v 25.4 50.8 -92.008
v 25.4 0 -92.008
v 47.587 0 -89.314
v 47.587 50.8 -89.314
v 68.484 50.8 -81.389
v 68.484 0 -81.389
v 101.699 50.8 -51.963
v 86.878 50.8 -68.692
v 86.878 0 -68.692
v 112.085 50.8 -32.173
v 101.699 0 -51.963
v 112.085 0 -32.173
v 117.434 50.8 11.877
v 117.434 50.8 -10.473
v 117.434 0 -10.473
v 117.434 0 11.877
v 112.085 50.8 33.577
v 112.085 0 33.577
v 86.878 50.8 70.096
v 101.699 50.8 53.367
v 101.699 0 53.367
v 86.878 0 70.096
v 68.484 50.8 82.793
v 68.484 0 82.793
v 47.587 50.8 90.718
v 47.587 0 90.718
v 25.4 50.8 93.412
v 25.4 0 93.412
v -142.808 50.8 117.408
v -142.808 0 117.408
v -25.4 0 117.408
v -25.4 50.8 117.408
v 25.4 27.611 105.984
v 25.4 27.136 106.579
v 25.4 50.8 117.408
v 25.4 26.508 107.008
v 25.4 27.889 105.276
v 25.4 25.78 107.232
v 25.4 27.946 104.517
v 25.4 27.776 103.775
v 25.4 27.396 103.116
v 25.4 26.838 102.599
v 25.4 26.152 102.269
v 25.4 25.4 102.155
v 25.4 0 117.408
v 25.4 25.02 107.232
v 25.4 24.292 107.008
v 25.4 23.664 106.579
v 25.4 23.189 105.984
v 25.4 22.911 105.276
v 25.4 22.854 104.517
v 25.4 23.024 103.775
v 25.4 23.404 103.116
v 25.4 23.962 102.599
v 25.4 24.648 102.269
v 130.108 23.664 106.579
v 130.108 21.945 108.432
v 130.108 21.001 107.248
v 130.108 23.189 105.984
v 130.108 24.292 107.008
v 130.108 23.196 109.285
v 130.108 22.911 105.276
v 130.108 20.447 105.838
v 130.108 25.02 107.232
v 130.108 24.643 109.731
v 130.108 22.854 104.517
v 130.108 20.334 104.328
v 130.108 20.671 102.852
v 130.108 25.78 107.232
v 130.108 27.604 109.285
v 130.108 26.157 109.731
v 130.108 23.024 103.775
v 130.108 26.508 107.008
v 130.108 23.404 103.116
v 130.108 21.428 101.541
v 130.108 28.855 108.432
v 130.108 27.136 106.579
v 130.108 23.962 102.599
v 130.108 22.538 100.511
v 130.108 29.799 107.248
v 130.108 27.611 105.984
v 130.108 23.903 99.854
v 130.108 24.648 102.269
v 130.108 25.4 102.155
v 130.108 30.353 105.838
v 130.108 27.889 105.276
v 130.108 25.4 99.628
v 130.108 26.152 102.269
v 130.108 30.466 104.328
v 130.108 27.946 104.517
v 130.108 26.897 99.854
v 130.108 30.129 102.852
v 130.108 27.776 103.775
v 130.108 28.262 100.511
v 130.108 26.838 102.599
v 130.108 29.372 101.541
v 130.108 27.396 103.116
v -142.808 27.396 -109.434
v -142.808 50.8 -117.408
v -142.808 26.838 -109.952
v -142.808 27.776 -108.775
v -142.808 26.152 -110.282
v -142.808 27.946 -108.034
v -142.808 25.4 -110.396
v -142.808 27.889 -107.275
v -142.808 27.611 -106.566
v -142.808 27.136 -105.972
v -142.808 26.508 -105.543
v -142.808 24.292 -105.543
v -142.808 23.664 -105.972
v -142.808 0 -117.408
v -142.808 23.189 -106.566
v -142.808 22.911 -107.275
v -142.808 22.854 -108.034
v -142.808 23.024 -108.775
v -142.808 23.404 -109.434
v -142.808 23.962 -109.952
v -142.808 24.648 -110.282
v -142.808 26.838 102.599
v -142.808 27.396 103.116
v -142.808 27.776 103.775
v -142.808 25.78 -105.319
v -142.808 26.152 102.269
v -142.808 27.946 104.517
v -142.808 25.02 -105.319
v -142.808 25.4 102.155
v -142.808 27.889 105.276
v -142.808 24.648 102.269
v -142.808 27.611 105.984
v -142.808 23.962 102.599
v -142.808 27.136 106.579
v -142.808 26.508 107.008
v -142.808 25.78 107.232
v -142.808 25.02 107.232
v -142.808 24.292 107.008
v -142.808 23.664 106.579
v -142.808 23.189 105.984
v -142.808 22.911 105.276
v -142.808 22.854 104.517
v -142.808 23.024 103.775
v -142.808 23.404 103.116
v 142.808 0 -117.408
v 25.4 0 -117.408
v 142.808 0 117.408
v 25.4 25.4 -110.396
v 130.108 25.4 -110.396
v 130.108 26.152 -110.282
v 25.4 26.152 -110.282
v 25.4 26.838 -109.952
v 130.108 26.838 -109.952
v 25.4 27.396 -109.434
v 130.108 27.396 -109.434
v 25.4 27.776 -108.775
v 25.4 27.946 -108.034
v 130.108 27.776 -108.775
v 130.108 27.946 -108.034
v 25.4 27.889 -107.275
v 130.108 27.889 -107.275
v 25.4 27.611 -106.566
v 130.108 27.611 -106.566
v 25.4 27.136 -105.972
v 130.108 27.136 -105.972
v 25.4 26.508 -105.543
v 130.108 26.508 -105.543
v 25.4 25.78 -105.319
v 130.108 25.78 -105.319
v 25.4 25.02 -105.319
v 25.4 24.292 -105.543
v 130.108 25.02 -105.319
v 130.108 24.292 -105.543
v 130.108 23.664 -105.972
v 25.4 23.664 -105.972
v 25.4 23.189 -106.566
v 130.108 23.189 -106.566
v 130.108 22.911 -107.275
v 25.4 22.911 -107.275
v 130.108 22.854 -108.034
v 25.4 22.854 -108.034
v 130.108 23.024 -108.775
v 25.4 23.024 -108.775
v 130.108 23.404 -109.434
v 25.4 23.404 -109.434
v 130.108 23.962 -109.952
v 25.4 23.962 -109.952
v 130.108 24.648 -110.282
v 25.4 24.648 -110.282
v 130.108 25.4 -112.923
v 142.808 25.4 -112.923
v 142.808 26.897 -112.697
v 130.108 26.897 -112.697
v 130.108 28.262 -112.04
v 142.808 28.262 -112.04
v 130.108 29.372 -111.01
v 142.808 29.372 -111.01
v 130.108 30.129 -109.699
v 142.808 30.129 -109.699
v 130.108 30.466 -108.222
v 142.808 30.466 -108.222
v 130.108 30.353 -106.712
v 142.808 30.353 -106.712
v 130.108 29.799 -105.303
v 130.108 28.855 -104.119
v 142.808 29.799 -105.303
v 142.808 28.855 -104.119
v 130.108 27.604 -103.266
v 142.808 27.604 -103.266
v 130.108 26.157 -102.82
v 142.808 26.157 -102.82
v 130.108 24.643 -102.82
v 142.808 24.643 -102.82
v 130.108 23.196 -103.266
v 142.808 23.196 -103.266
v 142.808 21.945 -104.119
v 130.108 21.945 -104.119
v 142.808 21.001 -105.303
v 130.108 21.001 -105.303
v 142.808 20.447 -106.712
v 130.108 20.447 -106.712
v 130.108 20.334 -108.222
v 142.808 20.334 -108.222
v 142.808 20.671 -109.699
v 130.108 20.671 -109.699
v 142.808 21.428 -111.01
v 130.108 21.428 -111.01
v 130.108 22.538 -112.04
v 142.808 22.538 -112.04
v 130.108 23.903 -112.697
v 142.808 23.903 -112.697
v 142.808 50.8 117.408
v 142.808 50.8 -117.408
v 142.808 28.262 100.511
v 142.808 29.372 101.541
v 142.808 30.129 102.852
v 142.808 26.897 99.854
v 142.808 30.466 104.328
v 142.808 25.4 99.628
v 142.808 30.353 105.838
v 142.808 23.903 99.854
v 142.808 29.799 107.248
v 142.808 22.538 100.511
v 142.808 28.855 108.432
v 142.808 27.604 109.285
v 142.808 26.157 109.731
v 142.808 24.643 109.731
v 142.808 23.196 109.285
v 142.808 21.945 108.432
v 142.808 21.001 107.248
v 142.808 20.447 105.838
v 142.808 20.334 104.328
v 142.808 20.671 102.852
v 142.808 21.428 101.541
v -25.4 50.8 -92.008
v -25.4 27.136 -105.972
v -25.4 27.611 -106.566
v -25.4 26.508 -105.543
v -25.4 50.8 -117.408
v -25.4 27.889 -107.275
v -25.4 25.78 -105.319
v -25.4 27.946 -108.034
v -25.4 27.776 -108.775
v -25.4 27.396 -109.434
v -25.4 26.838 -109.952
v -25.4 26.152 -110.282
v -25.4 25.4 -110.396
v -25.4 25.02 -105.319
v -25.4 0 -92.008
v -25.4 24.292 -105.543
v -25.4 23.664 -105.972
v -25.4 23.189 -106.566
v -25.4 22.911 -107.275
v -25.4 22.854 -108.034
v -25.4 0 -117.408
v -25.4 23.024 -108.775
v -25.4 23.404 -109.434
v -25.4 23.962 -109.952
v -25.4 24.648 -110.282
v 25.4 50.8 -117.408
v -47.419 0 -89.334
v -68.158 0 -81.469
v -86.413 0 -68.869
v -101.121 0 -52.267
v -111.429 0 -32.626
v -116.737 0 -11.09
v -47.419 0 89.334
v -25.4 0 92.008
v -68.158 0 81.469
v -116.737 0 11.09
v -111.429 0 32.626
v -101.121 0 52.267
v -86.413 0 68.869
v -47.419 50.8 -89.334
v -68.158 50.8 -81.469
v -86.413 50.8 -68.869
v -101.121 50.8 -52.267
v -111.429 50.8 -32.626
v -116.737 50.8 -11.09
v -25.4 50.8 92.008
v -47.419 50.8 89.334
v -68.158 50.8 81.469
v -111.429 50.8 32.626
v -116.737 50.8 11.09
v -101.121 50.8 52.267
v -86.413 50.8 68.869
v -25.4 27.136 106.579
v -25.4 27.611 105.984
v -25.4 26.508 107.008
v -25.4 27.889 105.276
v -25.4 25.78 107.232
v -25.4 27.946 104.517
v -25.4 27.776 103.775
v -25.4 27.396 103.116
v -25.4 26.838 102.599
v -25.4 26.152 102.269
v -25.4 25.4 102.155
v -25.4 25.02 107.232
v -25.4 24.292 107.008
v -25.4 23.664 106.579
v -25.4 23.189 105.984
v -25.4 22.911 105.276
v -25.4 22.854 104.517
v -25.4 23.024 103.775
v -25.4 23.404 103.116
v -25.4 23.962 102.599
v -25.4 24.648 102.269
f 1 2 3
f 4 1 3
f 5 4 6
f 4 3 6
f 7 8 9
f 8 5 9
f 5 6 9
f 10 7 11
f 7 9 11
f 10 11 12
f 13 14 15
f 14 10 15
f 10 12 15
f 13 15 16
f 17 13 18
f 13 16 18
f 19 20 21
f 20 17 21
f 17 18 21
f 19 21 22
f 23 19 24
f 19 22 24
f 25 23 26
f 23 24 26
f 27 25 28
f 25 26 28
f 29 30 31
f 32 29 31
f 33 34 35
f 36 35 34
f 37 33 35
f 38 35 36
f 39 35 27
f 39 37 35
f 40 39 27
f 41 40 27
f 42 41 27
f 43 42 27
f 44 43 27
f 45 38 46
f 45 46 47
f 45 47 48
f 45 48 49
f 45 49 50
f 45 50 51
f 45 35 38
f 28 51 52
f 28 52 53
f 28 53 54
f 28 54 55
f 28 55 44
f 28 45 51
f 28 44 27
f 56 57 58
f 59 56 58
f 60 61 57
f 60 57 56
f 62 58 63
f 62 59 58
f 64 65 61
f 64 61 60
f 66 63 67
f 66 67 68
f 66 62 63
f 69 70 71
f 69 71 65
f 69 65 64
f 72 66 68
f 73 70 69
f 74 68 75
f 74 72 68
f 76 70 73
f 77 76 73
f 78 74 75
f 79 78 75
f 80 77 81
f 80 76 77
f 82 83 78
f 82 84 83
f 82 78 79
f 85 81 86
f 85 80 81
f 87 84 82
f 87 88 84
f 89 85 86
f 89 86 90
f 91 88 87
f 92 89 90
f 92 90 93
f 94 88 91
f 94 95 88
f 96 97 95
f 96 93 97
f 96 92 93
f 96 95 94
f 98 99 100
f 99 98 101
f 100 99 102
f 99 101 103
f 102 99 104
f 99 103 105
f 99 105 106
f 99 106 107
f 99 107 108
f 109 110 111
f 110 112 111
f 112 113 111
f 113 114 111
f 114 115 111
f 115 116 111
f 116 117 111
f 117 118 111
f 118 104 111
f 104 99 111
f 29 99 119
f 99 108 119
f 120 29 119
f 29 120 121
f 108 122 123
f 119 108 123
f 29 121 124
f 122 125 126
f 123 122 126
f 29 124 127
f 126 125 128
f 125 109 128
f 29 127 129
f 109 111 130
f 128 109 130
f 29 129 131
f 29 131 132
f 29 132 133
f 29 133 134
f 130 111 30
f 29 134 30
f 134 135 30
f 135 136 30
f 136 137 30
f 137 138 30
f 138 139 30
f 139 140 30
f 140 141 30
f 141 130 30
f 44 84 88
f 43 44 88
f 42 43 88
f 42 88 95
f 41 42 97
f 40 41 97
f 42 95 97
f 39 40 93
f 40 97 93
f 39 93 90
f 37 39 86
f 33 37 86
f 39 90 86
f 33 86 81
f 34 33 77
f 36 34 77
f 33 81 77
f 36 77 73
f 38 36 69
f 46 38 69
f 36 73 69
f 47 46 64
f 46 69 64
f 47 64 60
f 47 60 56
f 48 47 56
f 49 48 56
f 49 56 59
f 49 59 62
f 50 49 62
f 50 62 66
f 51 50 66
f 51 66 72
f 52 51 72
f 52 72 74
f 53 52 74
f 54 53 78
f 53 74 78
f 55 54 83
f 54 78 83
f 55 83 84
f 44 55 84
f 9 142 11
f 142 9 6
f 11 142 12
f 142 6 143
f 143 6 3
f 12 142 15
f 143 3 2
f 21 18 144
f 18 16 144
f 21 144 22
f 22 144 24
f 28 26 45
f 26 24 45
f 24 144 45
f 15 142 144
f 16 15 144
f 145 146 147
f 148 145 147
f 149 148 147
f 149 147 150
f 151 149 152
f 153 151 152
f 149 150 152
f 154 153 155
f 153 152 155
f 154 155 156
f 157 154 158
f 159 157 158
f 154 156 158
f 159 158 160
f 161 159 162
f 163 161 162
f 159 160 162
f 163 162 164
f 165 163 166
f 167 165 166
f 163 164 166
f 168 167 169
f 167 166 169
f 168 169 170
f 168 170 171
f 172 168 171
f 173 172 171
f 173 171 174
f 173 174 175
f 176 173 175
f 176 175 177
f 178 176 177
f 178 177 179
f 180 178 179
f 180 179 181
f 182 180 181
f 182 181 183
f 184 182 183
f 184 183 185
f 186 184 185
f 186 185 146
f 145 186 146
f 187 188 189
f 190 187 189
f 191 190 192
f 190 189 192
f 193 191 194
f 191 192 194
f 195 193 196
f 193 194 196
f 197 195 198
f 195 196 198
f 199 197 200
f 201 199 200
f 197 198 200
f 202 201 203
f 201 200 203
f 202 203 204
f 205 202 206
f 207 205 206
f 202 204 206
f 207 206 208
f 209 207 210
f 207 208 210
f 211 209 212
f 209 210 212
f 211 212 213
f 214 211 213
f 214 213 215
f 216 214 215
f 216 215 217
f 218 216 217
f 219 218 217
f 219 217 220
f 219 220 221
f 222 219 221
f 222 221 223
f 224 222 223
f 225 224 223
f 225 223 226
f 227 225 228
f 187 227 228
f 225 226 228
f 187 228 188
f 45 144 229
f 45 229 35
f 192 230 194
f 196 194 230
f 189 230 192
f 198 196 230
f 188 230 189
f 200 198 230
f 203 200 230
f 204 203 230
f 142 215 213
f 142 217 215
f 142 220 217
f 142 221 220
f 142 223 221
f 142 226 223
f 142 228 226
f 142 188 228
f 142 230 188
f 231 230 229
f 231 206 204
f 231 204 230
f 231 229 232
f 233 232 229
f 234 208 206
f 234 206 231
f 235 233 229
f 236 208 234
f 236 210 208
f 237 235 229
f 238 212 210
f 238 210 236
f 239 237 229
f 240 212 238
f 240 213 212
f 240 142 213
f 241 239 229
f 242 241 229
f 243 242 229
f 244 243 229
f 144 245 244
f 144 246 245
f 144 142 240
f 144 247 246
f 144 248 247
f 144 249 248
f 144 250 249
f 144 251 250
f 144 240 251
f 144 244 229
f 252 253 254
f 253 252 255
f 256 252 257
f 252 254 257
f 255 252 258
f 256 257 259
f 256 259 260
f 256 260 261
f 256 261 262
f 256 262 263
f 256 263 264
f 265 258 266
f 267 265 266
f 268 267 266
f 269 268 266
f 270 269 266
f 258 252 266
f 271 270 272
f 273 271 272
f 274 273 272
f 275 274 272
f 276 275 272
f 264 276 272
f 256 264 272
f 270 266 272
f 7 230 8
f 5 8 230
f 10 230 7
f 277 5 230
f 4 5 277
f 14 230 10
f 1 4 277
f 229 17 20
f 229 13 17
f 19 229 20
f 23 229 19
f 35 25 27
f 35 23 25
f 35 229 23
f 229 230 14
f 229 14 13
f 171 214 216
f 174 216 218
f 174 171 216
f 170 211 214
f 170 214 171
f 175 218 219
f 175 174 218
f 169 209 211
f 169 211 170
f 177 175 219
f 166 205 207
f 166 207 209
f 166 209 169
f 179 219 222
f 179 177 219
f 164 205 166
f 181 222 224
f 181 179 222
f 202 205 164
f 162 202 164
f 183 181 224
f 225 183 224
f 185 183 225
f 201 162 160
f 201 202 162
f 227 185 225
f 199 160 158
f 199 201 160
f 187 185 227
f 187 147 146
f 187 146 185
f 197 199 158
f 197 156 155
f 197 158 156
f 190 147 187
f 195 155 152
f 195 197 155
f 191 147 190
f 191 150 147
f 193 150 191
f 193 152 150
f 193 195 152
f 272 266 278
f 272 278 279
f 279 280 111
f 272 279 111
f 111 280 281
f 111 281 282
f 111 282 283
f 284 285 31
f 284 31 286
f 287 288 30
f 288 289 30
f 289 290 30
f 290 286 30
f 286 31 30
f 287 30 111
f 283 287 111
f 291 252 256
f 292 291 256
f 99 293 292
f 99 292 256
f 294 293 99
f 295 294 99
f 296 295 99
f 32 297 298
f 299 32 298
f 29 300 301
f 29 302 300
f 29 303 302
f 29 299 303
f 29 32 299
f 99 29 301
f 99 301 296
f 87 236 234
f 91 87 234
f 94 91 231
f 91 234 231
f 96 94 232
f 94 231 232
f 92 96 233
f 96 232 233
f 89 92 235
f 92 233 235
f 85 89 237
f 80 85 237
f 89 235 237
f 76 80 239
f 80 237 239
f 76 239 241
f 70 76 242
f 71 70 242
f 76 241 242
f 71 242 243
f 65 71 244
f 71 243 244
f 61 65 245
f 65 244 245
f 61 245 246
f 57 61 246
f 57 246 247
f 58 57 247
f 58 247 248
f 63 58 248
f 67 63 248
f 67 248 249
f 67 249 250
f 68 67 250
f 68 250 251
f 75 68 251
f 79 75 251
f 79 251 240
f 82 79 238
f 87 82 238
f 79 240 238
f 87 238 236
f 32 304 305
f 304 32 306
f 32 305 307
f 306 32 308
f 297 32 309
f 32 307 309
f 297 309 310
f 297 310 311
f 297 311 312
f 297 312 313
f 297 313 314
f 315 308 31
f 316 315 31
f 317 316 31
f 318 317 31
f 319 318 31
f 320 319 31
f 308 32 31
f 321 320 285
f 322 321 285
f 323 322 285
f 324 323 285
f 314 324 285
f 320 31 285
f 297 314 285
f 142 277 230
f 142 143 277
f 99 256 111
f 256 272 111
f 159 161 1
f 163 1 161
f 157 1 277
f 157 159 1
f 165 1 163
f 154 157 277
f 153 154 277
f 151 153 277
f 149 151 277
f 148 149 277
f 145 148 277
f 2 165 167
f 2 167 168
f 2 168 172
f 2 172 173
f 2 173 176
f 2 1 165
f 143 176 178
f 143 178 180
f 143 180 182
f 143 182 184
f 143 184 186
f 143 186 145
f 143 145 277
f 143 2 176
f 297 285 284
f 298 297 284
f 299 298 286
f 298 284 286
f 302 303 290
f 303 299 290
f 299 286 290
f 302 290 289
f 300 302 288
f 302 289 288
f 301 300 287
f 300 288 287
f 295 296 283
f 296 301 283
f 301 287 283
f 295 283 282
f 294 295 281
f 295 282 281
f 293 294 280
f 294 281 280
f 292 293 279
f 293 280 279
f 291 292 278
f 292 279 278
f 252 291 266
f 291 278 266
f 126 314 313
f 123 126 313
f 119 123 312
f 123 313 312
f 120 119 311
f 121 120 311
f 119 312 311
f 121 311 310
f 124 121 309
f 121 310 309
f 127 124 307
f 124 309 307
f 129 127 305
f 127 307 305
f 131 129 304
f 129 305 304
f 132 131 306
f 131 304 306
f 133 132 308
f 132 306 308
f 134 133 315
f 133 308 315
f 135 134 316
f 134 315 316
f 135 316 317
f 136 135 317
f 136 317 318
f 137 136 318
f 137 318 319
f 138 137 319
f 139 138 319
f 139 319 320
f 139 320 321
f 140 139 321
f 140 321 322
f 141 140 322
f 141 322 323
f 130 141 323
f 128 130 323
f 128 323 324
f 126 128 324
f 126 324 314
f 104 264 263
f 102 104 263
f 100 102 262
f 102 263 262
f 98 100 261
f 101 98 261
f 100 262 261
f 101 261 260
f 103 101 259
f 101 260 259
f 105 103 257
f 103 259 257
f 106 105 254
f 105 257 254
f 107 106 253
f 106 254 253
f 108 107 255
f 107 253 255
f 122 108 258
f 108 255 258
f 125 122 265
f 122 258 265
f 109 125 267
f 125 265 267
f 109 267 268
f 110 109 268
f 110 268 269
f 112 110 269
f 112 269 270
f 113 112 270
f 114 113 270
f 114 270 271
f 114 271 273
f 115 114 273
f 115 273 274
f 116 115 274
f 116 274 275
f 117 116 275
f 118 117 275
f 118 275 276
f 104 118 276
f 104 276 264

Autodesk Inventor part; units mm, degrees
ref_plane "YZ Plane" through (0, 0, 0) normal (1, 0, 0) x (0, 1, 0)
ref_plane "XZ Plane" through (0, 0, 0) normal (0, 1, 0) x (-1, 0, 0)
ref_plane "XY Plane" through (0, 0, 0) normal (0, 0, 1) x (1, 0, 0)
sketch "Sketch1" plane through (0, 0, 0) normal (0, 1, 0) x (-1, 0, 0)
  line L0 (25.4, -117.408) -> (142.808, -117.408)
  line L1 (142.808, -117.408) -> (142.808, 117.408)
  line L2 (142.808, 117.408) -> (25.4, 117.408)
  line L3 (25.4, 117.408) -> (25.4, 92.008)
  line L4 (25.4, -92.008) -> (25.4, -117.408)
  line L5 (25.4, 117.408) -> (25.4, 92.008)
  line L6 (25.4, -92.008) -> (25.4, -117.408)
  arc A0 (25.4, -92.008) -> (25.4, 92.008) centre (25.4, 0) ccw
  line L7 (-25.4, -117.408) -> (-142.808, -117.408)
  line L8 (-142.808, -117.408) -> (-142.808, 117.408)
  line L9 (-142.808, 117.408) -> (-25.4, 117.408)
  line L10 (-25.4, 117.408) -> (-25.4, 93.412)
  line L11 (-25.4, -92.008) -> (-25.4, -117.408)
  line L12 (-25.4, 117.408) -> (-25.4, 93.412)
  line L13 (-25.4, -92.008) -> (-25.4, -117.408)
  arc A1 (-25.4, 93.412) -> (-25.4, -92.008) centre (-25.4, 0.702) ccw
  point P0 (0, 0)
  dimension "d6" = 25.4
  dimension "d17" = 92.71
extrude "Extrusion1" add sketch "Sketch1" along normal blind 50.8
sketch "Sketch2" plane through (142.808, 0, 117.408) normal (1, 0, 0) x (0, 0, -1)
  circle A0 centre (12.7, 25.4) radius 5.08
  circle A1 centre (225.2508, 25.4) radius 5.08
  circle A2 centre (12.7, 25.4) radius 2.5527
  circle A3 centre (225.2508, 25.4) radius 2.5527
  line L0 (0, 50.8) -> (234.816, 50.8) projected
  line L1 (0, 0) -> (0, 50.8) projected
  point P0 (117.408, 0)
  dimension "d9" = 10.16
  dimension "d10" = 10.16
  dimension "d11" = 5.1054
  dimension "d12" = 5.1054
  dimension "d18" = 25.4
  dimension "d19" = 25.4
  dimension "d21" = 12.7
extrude "Extrusion2" cut sketch "Sketch2" against normal through all contours A2 | A3
extrude "Extrusion3" cut sketch "Sketch2" against normal blind 12.7
properties part number "Scuba Tank Holder"
